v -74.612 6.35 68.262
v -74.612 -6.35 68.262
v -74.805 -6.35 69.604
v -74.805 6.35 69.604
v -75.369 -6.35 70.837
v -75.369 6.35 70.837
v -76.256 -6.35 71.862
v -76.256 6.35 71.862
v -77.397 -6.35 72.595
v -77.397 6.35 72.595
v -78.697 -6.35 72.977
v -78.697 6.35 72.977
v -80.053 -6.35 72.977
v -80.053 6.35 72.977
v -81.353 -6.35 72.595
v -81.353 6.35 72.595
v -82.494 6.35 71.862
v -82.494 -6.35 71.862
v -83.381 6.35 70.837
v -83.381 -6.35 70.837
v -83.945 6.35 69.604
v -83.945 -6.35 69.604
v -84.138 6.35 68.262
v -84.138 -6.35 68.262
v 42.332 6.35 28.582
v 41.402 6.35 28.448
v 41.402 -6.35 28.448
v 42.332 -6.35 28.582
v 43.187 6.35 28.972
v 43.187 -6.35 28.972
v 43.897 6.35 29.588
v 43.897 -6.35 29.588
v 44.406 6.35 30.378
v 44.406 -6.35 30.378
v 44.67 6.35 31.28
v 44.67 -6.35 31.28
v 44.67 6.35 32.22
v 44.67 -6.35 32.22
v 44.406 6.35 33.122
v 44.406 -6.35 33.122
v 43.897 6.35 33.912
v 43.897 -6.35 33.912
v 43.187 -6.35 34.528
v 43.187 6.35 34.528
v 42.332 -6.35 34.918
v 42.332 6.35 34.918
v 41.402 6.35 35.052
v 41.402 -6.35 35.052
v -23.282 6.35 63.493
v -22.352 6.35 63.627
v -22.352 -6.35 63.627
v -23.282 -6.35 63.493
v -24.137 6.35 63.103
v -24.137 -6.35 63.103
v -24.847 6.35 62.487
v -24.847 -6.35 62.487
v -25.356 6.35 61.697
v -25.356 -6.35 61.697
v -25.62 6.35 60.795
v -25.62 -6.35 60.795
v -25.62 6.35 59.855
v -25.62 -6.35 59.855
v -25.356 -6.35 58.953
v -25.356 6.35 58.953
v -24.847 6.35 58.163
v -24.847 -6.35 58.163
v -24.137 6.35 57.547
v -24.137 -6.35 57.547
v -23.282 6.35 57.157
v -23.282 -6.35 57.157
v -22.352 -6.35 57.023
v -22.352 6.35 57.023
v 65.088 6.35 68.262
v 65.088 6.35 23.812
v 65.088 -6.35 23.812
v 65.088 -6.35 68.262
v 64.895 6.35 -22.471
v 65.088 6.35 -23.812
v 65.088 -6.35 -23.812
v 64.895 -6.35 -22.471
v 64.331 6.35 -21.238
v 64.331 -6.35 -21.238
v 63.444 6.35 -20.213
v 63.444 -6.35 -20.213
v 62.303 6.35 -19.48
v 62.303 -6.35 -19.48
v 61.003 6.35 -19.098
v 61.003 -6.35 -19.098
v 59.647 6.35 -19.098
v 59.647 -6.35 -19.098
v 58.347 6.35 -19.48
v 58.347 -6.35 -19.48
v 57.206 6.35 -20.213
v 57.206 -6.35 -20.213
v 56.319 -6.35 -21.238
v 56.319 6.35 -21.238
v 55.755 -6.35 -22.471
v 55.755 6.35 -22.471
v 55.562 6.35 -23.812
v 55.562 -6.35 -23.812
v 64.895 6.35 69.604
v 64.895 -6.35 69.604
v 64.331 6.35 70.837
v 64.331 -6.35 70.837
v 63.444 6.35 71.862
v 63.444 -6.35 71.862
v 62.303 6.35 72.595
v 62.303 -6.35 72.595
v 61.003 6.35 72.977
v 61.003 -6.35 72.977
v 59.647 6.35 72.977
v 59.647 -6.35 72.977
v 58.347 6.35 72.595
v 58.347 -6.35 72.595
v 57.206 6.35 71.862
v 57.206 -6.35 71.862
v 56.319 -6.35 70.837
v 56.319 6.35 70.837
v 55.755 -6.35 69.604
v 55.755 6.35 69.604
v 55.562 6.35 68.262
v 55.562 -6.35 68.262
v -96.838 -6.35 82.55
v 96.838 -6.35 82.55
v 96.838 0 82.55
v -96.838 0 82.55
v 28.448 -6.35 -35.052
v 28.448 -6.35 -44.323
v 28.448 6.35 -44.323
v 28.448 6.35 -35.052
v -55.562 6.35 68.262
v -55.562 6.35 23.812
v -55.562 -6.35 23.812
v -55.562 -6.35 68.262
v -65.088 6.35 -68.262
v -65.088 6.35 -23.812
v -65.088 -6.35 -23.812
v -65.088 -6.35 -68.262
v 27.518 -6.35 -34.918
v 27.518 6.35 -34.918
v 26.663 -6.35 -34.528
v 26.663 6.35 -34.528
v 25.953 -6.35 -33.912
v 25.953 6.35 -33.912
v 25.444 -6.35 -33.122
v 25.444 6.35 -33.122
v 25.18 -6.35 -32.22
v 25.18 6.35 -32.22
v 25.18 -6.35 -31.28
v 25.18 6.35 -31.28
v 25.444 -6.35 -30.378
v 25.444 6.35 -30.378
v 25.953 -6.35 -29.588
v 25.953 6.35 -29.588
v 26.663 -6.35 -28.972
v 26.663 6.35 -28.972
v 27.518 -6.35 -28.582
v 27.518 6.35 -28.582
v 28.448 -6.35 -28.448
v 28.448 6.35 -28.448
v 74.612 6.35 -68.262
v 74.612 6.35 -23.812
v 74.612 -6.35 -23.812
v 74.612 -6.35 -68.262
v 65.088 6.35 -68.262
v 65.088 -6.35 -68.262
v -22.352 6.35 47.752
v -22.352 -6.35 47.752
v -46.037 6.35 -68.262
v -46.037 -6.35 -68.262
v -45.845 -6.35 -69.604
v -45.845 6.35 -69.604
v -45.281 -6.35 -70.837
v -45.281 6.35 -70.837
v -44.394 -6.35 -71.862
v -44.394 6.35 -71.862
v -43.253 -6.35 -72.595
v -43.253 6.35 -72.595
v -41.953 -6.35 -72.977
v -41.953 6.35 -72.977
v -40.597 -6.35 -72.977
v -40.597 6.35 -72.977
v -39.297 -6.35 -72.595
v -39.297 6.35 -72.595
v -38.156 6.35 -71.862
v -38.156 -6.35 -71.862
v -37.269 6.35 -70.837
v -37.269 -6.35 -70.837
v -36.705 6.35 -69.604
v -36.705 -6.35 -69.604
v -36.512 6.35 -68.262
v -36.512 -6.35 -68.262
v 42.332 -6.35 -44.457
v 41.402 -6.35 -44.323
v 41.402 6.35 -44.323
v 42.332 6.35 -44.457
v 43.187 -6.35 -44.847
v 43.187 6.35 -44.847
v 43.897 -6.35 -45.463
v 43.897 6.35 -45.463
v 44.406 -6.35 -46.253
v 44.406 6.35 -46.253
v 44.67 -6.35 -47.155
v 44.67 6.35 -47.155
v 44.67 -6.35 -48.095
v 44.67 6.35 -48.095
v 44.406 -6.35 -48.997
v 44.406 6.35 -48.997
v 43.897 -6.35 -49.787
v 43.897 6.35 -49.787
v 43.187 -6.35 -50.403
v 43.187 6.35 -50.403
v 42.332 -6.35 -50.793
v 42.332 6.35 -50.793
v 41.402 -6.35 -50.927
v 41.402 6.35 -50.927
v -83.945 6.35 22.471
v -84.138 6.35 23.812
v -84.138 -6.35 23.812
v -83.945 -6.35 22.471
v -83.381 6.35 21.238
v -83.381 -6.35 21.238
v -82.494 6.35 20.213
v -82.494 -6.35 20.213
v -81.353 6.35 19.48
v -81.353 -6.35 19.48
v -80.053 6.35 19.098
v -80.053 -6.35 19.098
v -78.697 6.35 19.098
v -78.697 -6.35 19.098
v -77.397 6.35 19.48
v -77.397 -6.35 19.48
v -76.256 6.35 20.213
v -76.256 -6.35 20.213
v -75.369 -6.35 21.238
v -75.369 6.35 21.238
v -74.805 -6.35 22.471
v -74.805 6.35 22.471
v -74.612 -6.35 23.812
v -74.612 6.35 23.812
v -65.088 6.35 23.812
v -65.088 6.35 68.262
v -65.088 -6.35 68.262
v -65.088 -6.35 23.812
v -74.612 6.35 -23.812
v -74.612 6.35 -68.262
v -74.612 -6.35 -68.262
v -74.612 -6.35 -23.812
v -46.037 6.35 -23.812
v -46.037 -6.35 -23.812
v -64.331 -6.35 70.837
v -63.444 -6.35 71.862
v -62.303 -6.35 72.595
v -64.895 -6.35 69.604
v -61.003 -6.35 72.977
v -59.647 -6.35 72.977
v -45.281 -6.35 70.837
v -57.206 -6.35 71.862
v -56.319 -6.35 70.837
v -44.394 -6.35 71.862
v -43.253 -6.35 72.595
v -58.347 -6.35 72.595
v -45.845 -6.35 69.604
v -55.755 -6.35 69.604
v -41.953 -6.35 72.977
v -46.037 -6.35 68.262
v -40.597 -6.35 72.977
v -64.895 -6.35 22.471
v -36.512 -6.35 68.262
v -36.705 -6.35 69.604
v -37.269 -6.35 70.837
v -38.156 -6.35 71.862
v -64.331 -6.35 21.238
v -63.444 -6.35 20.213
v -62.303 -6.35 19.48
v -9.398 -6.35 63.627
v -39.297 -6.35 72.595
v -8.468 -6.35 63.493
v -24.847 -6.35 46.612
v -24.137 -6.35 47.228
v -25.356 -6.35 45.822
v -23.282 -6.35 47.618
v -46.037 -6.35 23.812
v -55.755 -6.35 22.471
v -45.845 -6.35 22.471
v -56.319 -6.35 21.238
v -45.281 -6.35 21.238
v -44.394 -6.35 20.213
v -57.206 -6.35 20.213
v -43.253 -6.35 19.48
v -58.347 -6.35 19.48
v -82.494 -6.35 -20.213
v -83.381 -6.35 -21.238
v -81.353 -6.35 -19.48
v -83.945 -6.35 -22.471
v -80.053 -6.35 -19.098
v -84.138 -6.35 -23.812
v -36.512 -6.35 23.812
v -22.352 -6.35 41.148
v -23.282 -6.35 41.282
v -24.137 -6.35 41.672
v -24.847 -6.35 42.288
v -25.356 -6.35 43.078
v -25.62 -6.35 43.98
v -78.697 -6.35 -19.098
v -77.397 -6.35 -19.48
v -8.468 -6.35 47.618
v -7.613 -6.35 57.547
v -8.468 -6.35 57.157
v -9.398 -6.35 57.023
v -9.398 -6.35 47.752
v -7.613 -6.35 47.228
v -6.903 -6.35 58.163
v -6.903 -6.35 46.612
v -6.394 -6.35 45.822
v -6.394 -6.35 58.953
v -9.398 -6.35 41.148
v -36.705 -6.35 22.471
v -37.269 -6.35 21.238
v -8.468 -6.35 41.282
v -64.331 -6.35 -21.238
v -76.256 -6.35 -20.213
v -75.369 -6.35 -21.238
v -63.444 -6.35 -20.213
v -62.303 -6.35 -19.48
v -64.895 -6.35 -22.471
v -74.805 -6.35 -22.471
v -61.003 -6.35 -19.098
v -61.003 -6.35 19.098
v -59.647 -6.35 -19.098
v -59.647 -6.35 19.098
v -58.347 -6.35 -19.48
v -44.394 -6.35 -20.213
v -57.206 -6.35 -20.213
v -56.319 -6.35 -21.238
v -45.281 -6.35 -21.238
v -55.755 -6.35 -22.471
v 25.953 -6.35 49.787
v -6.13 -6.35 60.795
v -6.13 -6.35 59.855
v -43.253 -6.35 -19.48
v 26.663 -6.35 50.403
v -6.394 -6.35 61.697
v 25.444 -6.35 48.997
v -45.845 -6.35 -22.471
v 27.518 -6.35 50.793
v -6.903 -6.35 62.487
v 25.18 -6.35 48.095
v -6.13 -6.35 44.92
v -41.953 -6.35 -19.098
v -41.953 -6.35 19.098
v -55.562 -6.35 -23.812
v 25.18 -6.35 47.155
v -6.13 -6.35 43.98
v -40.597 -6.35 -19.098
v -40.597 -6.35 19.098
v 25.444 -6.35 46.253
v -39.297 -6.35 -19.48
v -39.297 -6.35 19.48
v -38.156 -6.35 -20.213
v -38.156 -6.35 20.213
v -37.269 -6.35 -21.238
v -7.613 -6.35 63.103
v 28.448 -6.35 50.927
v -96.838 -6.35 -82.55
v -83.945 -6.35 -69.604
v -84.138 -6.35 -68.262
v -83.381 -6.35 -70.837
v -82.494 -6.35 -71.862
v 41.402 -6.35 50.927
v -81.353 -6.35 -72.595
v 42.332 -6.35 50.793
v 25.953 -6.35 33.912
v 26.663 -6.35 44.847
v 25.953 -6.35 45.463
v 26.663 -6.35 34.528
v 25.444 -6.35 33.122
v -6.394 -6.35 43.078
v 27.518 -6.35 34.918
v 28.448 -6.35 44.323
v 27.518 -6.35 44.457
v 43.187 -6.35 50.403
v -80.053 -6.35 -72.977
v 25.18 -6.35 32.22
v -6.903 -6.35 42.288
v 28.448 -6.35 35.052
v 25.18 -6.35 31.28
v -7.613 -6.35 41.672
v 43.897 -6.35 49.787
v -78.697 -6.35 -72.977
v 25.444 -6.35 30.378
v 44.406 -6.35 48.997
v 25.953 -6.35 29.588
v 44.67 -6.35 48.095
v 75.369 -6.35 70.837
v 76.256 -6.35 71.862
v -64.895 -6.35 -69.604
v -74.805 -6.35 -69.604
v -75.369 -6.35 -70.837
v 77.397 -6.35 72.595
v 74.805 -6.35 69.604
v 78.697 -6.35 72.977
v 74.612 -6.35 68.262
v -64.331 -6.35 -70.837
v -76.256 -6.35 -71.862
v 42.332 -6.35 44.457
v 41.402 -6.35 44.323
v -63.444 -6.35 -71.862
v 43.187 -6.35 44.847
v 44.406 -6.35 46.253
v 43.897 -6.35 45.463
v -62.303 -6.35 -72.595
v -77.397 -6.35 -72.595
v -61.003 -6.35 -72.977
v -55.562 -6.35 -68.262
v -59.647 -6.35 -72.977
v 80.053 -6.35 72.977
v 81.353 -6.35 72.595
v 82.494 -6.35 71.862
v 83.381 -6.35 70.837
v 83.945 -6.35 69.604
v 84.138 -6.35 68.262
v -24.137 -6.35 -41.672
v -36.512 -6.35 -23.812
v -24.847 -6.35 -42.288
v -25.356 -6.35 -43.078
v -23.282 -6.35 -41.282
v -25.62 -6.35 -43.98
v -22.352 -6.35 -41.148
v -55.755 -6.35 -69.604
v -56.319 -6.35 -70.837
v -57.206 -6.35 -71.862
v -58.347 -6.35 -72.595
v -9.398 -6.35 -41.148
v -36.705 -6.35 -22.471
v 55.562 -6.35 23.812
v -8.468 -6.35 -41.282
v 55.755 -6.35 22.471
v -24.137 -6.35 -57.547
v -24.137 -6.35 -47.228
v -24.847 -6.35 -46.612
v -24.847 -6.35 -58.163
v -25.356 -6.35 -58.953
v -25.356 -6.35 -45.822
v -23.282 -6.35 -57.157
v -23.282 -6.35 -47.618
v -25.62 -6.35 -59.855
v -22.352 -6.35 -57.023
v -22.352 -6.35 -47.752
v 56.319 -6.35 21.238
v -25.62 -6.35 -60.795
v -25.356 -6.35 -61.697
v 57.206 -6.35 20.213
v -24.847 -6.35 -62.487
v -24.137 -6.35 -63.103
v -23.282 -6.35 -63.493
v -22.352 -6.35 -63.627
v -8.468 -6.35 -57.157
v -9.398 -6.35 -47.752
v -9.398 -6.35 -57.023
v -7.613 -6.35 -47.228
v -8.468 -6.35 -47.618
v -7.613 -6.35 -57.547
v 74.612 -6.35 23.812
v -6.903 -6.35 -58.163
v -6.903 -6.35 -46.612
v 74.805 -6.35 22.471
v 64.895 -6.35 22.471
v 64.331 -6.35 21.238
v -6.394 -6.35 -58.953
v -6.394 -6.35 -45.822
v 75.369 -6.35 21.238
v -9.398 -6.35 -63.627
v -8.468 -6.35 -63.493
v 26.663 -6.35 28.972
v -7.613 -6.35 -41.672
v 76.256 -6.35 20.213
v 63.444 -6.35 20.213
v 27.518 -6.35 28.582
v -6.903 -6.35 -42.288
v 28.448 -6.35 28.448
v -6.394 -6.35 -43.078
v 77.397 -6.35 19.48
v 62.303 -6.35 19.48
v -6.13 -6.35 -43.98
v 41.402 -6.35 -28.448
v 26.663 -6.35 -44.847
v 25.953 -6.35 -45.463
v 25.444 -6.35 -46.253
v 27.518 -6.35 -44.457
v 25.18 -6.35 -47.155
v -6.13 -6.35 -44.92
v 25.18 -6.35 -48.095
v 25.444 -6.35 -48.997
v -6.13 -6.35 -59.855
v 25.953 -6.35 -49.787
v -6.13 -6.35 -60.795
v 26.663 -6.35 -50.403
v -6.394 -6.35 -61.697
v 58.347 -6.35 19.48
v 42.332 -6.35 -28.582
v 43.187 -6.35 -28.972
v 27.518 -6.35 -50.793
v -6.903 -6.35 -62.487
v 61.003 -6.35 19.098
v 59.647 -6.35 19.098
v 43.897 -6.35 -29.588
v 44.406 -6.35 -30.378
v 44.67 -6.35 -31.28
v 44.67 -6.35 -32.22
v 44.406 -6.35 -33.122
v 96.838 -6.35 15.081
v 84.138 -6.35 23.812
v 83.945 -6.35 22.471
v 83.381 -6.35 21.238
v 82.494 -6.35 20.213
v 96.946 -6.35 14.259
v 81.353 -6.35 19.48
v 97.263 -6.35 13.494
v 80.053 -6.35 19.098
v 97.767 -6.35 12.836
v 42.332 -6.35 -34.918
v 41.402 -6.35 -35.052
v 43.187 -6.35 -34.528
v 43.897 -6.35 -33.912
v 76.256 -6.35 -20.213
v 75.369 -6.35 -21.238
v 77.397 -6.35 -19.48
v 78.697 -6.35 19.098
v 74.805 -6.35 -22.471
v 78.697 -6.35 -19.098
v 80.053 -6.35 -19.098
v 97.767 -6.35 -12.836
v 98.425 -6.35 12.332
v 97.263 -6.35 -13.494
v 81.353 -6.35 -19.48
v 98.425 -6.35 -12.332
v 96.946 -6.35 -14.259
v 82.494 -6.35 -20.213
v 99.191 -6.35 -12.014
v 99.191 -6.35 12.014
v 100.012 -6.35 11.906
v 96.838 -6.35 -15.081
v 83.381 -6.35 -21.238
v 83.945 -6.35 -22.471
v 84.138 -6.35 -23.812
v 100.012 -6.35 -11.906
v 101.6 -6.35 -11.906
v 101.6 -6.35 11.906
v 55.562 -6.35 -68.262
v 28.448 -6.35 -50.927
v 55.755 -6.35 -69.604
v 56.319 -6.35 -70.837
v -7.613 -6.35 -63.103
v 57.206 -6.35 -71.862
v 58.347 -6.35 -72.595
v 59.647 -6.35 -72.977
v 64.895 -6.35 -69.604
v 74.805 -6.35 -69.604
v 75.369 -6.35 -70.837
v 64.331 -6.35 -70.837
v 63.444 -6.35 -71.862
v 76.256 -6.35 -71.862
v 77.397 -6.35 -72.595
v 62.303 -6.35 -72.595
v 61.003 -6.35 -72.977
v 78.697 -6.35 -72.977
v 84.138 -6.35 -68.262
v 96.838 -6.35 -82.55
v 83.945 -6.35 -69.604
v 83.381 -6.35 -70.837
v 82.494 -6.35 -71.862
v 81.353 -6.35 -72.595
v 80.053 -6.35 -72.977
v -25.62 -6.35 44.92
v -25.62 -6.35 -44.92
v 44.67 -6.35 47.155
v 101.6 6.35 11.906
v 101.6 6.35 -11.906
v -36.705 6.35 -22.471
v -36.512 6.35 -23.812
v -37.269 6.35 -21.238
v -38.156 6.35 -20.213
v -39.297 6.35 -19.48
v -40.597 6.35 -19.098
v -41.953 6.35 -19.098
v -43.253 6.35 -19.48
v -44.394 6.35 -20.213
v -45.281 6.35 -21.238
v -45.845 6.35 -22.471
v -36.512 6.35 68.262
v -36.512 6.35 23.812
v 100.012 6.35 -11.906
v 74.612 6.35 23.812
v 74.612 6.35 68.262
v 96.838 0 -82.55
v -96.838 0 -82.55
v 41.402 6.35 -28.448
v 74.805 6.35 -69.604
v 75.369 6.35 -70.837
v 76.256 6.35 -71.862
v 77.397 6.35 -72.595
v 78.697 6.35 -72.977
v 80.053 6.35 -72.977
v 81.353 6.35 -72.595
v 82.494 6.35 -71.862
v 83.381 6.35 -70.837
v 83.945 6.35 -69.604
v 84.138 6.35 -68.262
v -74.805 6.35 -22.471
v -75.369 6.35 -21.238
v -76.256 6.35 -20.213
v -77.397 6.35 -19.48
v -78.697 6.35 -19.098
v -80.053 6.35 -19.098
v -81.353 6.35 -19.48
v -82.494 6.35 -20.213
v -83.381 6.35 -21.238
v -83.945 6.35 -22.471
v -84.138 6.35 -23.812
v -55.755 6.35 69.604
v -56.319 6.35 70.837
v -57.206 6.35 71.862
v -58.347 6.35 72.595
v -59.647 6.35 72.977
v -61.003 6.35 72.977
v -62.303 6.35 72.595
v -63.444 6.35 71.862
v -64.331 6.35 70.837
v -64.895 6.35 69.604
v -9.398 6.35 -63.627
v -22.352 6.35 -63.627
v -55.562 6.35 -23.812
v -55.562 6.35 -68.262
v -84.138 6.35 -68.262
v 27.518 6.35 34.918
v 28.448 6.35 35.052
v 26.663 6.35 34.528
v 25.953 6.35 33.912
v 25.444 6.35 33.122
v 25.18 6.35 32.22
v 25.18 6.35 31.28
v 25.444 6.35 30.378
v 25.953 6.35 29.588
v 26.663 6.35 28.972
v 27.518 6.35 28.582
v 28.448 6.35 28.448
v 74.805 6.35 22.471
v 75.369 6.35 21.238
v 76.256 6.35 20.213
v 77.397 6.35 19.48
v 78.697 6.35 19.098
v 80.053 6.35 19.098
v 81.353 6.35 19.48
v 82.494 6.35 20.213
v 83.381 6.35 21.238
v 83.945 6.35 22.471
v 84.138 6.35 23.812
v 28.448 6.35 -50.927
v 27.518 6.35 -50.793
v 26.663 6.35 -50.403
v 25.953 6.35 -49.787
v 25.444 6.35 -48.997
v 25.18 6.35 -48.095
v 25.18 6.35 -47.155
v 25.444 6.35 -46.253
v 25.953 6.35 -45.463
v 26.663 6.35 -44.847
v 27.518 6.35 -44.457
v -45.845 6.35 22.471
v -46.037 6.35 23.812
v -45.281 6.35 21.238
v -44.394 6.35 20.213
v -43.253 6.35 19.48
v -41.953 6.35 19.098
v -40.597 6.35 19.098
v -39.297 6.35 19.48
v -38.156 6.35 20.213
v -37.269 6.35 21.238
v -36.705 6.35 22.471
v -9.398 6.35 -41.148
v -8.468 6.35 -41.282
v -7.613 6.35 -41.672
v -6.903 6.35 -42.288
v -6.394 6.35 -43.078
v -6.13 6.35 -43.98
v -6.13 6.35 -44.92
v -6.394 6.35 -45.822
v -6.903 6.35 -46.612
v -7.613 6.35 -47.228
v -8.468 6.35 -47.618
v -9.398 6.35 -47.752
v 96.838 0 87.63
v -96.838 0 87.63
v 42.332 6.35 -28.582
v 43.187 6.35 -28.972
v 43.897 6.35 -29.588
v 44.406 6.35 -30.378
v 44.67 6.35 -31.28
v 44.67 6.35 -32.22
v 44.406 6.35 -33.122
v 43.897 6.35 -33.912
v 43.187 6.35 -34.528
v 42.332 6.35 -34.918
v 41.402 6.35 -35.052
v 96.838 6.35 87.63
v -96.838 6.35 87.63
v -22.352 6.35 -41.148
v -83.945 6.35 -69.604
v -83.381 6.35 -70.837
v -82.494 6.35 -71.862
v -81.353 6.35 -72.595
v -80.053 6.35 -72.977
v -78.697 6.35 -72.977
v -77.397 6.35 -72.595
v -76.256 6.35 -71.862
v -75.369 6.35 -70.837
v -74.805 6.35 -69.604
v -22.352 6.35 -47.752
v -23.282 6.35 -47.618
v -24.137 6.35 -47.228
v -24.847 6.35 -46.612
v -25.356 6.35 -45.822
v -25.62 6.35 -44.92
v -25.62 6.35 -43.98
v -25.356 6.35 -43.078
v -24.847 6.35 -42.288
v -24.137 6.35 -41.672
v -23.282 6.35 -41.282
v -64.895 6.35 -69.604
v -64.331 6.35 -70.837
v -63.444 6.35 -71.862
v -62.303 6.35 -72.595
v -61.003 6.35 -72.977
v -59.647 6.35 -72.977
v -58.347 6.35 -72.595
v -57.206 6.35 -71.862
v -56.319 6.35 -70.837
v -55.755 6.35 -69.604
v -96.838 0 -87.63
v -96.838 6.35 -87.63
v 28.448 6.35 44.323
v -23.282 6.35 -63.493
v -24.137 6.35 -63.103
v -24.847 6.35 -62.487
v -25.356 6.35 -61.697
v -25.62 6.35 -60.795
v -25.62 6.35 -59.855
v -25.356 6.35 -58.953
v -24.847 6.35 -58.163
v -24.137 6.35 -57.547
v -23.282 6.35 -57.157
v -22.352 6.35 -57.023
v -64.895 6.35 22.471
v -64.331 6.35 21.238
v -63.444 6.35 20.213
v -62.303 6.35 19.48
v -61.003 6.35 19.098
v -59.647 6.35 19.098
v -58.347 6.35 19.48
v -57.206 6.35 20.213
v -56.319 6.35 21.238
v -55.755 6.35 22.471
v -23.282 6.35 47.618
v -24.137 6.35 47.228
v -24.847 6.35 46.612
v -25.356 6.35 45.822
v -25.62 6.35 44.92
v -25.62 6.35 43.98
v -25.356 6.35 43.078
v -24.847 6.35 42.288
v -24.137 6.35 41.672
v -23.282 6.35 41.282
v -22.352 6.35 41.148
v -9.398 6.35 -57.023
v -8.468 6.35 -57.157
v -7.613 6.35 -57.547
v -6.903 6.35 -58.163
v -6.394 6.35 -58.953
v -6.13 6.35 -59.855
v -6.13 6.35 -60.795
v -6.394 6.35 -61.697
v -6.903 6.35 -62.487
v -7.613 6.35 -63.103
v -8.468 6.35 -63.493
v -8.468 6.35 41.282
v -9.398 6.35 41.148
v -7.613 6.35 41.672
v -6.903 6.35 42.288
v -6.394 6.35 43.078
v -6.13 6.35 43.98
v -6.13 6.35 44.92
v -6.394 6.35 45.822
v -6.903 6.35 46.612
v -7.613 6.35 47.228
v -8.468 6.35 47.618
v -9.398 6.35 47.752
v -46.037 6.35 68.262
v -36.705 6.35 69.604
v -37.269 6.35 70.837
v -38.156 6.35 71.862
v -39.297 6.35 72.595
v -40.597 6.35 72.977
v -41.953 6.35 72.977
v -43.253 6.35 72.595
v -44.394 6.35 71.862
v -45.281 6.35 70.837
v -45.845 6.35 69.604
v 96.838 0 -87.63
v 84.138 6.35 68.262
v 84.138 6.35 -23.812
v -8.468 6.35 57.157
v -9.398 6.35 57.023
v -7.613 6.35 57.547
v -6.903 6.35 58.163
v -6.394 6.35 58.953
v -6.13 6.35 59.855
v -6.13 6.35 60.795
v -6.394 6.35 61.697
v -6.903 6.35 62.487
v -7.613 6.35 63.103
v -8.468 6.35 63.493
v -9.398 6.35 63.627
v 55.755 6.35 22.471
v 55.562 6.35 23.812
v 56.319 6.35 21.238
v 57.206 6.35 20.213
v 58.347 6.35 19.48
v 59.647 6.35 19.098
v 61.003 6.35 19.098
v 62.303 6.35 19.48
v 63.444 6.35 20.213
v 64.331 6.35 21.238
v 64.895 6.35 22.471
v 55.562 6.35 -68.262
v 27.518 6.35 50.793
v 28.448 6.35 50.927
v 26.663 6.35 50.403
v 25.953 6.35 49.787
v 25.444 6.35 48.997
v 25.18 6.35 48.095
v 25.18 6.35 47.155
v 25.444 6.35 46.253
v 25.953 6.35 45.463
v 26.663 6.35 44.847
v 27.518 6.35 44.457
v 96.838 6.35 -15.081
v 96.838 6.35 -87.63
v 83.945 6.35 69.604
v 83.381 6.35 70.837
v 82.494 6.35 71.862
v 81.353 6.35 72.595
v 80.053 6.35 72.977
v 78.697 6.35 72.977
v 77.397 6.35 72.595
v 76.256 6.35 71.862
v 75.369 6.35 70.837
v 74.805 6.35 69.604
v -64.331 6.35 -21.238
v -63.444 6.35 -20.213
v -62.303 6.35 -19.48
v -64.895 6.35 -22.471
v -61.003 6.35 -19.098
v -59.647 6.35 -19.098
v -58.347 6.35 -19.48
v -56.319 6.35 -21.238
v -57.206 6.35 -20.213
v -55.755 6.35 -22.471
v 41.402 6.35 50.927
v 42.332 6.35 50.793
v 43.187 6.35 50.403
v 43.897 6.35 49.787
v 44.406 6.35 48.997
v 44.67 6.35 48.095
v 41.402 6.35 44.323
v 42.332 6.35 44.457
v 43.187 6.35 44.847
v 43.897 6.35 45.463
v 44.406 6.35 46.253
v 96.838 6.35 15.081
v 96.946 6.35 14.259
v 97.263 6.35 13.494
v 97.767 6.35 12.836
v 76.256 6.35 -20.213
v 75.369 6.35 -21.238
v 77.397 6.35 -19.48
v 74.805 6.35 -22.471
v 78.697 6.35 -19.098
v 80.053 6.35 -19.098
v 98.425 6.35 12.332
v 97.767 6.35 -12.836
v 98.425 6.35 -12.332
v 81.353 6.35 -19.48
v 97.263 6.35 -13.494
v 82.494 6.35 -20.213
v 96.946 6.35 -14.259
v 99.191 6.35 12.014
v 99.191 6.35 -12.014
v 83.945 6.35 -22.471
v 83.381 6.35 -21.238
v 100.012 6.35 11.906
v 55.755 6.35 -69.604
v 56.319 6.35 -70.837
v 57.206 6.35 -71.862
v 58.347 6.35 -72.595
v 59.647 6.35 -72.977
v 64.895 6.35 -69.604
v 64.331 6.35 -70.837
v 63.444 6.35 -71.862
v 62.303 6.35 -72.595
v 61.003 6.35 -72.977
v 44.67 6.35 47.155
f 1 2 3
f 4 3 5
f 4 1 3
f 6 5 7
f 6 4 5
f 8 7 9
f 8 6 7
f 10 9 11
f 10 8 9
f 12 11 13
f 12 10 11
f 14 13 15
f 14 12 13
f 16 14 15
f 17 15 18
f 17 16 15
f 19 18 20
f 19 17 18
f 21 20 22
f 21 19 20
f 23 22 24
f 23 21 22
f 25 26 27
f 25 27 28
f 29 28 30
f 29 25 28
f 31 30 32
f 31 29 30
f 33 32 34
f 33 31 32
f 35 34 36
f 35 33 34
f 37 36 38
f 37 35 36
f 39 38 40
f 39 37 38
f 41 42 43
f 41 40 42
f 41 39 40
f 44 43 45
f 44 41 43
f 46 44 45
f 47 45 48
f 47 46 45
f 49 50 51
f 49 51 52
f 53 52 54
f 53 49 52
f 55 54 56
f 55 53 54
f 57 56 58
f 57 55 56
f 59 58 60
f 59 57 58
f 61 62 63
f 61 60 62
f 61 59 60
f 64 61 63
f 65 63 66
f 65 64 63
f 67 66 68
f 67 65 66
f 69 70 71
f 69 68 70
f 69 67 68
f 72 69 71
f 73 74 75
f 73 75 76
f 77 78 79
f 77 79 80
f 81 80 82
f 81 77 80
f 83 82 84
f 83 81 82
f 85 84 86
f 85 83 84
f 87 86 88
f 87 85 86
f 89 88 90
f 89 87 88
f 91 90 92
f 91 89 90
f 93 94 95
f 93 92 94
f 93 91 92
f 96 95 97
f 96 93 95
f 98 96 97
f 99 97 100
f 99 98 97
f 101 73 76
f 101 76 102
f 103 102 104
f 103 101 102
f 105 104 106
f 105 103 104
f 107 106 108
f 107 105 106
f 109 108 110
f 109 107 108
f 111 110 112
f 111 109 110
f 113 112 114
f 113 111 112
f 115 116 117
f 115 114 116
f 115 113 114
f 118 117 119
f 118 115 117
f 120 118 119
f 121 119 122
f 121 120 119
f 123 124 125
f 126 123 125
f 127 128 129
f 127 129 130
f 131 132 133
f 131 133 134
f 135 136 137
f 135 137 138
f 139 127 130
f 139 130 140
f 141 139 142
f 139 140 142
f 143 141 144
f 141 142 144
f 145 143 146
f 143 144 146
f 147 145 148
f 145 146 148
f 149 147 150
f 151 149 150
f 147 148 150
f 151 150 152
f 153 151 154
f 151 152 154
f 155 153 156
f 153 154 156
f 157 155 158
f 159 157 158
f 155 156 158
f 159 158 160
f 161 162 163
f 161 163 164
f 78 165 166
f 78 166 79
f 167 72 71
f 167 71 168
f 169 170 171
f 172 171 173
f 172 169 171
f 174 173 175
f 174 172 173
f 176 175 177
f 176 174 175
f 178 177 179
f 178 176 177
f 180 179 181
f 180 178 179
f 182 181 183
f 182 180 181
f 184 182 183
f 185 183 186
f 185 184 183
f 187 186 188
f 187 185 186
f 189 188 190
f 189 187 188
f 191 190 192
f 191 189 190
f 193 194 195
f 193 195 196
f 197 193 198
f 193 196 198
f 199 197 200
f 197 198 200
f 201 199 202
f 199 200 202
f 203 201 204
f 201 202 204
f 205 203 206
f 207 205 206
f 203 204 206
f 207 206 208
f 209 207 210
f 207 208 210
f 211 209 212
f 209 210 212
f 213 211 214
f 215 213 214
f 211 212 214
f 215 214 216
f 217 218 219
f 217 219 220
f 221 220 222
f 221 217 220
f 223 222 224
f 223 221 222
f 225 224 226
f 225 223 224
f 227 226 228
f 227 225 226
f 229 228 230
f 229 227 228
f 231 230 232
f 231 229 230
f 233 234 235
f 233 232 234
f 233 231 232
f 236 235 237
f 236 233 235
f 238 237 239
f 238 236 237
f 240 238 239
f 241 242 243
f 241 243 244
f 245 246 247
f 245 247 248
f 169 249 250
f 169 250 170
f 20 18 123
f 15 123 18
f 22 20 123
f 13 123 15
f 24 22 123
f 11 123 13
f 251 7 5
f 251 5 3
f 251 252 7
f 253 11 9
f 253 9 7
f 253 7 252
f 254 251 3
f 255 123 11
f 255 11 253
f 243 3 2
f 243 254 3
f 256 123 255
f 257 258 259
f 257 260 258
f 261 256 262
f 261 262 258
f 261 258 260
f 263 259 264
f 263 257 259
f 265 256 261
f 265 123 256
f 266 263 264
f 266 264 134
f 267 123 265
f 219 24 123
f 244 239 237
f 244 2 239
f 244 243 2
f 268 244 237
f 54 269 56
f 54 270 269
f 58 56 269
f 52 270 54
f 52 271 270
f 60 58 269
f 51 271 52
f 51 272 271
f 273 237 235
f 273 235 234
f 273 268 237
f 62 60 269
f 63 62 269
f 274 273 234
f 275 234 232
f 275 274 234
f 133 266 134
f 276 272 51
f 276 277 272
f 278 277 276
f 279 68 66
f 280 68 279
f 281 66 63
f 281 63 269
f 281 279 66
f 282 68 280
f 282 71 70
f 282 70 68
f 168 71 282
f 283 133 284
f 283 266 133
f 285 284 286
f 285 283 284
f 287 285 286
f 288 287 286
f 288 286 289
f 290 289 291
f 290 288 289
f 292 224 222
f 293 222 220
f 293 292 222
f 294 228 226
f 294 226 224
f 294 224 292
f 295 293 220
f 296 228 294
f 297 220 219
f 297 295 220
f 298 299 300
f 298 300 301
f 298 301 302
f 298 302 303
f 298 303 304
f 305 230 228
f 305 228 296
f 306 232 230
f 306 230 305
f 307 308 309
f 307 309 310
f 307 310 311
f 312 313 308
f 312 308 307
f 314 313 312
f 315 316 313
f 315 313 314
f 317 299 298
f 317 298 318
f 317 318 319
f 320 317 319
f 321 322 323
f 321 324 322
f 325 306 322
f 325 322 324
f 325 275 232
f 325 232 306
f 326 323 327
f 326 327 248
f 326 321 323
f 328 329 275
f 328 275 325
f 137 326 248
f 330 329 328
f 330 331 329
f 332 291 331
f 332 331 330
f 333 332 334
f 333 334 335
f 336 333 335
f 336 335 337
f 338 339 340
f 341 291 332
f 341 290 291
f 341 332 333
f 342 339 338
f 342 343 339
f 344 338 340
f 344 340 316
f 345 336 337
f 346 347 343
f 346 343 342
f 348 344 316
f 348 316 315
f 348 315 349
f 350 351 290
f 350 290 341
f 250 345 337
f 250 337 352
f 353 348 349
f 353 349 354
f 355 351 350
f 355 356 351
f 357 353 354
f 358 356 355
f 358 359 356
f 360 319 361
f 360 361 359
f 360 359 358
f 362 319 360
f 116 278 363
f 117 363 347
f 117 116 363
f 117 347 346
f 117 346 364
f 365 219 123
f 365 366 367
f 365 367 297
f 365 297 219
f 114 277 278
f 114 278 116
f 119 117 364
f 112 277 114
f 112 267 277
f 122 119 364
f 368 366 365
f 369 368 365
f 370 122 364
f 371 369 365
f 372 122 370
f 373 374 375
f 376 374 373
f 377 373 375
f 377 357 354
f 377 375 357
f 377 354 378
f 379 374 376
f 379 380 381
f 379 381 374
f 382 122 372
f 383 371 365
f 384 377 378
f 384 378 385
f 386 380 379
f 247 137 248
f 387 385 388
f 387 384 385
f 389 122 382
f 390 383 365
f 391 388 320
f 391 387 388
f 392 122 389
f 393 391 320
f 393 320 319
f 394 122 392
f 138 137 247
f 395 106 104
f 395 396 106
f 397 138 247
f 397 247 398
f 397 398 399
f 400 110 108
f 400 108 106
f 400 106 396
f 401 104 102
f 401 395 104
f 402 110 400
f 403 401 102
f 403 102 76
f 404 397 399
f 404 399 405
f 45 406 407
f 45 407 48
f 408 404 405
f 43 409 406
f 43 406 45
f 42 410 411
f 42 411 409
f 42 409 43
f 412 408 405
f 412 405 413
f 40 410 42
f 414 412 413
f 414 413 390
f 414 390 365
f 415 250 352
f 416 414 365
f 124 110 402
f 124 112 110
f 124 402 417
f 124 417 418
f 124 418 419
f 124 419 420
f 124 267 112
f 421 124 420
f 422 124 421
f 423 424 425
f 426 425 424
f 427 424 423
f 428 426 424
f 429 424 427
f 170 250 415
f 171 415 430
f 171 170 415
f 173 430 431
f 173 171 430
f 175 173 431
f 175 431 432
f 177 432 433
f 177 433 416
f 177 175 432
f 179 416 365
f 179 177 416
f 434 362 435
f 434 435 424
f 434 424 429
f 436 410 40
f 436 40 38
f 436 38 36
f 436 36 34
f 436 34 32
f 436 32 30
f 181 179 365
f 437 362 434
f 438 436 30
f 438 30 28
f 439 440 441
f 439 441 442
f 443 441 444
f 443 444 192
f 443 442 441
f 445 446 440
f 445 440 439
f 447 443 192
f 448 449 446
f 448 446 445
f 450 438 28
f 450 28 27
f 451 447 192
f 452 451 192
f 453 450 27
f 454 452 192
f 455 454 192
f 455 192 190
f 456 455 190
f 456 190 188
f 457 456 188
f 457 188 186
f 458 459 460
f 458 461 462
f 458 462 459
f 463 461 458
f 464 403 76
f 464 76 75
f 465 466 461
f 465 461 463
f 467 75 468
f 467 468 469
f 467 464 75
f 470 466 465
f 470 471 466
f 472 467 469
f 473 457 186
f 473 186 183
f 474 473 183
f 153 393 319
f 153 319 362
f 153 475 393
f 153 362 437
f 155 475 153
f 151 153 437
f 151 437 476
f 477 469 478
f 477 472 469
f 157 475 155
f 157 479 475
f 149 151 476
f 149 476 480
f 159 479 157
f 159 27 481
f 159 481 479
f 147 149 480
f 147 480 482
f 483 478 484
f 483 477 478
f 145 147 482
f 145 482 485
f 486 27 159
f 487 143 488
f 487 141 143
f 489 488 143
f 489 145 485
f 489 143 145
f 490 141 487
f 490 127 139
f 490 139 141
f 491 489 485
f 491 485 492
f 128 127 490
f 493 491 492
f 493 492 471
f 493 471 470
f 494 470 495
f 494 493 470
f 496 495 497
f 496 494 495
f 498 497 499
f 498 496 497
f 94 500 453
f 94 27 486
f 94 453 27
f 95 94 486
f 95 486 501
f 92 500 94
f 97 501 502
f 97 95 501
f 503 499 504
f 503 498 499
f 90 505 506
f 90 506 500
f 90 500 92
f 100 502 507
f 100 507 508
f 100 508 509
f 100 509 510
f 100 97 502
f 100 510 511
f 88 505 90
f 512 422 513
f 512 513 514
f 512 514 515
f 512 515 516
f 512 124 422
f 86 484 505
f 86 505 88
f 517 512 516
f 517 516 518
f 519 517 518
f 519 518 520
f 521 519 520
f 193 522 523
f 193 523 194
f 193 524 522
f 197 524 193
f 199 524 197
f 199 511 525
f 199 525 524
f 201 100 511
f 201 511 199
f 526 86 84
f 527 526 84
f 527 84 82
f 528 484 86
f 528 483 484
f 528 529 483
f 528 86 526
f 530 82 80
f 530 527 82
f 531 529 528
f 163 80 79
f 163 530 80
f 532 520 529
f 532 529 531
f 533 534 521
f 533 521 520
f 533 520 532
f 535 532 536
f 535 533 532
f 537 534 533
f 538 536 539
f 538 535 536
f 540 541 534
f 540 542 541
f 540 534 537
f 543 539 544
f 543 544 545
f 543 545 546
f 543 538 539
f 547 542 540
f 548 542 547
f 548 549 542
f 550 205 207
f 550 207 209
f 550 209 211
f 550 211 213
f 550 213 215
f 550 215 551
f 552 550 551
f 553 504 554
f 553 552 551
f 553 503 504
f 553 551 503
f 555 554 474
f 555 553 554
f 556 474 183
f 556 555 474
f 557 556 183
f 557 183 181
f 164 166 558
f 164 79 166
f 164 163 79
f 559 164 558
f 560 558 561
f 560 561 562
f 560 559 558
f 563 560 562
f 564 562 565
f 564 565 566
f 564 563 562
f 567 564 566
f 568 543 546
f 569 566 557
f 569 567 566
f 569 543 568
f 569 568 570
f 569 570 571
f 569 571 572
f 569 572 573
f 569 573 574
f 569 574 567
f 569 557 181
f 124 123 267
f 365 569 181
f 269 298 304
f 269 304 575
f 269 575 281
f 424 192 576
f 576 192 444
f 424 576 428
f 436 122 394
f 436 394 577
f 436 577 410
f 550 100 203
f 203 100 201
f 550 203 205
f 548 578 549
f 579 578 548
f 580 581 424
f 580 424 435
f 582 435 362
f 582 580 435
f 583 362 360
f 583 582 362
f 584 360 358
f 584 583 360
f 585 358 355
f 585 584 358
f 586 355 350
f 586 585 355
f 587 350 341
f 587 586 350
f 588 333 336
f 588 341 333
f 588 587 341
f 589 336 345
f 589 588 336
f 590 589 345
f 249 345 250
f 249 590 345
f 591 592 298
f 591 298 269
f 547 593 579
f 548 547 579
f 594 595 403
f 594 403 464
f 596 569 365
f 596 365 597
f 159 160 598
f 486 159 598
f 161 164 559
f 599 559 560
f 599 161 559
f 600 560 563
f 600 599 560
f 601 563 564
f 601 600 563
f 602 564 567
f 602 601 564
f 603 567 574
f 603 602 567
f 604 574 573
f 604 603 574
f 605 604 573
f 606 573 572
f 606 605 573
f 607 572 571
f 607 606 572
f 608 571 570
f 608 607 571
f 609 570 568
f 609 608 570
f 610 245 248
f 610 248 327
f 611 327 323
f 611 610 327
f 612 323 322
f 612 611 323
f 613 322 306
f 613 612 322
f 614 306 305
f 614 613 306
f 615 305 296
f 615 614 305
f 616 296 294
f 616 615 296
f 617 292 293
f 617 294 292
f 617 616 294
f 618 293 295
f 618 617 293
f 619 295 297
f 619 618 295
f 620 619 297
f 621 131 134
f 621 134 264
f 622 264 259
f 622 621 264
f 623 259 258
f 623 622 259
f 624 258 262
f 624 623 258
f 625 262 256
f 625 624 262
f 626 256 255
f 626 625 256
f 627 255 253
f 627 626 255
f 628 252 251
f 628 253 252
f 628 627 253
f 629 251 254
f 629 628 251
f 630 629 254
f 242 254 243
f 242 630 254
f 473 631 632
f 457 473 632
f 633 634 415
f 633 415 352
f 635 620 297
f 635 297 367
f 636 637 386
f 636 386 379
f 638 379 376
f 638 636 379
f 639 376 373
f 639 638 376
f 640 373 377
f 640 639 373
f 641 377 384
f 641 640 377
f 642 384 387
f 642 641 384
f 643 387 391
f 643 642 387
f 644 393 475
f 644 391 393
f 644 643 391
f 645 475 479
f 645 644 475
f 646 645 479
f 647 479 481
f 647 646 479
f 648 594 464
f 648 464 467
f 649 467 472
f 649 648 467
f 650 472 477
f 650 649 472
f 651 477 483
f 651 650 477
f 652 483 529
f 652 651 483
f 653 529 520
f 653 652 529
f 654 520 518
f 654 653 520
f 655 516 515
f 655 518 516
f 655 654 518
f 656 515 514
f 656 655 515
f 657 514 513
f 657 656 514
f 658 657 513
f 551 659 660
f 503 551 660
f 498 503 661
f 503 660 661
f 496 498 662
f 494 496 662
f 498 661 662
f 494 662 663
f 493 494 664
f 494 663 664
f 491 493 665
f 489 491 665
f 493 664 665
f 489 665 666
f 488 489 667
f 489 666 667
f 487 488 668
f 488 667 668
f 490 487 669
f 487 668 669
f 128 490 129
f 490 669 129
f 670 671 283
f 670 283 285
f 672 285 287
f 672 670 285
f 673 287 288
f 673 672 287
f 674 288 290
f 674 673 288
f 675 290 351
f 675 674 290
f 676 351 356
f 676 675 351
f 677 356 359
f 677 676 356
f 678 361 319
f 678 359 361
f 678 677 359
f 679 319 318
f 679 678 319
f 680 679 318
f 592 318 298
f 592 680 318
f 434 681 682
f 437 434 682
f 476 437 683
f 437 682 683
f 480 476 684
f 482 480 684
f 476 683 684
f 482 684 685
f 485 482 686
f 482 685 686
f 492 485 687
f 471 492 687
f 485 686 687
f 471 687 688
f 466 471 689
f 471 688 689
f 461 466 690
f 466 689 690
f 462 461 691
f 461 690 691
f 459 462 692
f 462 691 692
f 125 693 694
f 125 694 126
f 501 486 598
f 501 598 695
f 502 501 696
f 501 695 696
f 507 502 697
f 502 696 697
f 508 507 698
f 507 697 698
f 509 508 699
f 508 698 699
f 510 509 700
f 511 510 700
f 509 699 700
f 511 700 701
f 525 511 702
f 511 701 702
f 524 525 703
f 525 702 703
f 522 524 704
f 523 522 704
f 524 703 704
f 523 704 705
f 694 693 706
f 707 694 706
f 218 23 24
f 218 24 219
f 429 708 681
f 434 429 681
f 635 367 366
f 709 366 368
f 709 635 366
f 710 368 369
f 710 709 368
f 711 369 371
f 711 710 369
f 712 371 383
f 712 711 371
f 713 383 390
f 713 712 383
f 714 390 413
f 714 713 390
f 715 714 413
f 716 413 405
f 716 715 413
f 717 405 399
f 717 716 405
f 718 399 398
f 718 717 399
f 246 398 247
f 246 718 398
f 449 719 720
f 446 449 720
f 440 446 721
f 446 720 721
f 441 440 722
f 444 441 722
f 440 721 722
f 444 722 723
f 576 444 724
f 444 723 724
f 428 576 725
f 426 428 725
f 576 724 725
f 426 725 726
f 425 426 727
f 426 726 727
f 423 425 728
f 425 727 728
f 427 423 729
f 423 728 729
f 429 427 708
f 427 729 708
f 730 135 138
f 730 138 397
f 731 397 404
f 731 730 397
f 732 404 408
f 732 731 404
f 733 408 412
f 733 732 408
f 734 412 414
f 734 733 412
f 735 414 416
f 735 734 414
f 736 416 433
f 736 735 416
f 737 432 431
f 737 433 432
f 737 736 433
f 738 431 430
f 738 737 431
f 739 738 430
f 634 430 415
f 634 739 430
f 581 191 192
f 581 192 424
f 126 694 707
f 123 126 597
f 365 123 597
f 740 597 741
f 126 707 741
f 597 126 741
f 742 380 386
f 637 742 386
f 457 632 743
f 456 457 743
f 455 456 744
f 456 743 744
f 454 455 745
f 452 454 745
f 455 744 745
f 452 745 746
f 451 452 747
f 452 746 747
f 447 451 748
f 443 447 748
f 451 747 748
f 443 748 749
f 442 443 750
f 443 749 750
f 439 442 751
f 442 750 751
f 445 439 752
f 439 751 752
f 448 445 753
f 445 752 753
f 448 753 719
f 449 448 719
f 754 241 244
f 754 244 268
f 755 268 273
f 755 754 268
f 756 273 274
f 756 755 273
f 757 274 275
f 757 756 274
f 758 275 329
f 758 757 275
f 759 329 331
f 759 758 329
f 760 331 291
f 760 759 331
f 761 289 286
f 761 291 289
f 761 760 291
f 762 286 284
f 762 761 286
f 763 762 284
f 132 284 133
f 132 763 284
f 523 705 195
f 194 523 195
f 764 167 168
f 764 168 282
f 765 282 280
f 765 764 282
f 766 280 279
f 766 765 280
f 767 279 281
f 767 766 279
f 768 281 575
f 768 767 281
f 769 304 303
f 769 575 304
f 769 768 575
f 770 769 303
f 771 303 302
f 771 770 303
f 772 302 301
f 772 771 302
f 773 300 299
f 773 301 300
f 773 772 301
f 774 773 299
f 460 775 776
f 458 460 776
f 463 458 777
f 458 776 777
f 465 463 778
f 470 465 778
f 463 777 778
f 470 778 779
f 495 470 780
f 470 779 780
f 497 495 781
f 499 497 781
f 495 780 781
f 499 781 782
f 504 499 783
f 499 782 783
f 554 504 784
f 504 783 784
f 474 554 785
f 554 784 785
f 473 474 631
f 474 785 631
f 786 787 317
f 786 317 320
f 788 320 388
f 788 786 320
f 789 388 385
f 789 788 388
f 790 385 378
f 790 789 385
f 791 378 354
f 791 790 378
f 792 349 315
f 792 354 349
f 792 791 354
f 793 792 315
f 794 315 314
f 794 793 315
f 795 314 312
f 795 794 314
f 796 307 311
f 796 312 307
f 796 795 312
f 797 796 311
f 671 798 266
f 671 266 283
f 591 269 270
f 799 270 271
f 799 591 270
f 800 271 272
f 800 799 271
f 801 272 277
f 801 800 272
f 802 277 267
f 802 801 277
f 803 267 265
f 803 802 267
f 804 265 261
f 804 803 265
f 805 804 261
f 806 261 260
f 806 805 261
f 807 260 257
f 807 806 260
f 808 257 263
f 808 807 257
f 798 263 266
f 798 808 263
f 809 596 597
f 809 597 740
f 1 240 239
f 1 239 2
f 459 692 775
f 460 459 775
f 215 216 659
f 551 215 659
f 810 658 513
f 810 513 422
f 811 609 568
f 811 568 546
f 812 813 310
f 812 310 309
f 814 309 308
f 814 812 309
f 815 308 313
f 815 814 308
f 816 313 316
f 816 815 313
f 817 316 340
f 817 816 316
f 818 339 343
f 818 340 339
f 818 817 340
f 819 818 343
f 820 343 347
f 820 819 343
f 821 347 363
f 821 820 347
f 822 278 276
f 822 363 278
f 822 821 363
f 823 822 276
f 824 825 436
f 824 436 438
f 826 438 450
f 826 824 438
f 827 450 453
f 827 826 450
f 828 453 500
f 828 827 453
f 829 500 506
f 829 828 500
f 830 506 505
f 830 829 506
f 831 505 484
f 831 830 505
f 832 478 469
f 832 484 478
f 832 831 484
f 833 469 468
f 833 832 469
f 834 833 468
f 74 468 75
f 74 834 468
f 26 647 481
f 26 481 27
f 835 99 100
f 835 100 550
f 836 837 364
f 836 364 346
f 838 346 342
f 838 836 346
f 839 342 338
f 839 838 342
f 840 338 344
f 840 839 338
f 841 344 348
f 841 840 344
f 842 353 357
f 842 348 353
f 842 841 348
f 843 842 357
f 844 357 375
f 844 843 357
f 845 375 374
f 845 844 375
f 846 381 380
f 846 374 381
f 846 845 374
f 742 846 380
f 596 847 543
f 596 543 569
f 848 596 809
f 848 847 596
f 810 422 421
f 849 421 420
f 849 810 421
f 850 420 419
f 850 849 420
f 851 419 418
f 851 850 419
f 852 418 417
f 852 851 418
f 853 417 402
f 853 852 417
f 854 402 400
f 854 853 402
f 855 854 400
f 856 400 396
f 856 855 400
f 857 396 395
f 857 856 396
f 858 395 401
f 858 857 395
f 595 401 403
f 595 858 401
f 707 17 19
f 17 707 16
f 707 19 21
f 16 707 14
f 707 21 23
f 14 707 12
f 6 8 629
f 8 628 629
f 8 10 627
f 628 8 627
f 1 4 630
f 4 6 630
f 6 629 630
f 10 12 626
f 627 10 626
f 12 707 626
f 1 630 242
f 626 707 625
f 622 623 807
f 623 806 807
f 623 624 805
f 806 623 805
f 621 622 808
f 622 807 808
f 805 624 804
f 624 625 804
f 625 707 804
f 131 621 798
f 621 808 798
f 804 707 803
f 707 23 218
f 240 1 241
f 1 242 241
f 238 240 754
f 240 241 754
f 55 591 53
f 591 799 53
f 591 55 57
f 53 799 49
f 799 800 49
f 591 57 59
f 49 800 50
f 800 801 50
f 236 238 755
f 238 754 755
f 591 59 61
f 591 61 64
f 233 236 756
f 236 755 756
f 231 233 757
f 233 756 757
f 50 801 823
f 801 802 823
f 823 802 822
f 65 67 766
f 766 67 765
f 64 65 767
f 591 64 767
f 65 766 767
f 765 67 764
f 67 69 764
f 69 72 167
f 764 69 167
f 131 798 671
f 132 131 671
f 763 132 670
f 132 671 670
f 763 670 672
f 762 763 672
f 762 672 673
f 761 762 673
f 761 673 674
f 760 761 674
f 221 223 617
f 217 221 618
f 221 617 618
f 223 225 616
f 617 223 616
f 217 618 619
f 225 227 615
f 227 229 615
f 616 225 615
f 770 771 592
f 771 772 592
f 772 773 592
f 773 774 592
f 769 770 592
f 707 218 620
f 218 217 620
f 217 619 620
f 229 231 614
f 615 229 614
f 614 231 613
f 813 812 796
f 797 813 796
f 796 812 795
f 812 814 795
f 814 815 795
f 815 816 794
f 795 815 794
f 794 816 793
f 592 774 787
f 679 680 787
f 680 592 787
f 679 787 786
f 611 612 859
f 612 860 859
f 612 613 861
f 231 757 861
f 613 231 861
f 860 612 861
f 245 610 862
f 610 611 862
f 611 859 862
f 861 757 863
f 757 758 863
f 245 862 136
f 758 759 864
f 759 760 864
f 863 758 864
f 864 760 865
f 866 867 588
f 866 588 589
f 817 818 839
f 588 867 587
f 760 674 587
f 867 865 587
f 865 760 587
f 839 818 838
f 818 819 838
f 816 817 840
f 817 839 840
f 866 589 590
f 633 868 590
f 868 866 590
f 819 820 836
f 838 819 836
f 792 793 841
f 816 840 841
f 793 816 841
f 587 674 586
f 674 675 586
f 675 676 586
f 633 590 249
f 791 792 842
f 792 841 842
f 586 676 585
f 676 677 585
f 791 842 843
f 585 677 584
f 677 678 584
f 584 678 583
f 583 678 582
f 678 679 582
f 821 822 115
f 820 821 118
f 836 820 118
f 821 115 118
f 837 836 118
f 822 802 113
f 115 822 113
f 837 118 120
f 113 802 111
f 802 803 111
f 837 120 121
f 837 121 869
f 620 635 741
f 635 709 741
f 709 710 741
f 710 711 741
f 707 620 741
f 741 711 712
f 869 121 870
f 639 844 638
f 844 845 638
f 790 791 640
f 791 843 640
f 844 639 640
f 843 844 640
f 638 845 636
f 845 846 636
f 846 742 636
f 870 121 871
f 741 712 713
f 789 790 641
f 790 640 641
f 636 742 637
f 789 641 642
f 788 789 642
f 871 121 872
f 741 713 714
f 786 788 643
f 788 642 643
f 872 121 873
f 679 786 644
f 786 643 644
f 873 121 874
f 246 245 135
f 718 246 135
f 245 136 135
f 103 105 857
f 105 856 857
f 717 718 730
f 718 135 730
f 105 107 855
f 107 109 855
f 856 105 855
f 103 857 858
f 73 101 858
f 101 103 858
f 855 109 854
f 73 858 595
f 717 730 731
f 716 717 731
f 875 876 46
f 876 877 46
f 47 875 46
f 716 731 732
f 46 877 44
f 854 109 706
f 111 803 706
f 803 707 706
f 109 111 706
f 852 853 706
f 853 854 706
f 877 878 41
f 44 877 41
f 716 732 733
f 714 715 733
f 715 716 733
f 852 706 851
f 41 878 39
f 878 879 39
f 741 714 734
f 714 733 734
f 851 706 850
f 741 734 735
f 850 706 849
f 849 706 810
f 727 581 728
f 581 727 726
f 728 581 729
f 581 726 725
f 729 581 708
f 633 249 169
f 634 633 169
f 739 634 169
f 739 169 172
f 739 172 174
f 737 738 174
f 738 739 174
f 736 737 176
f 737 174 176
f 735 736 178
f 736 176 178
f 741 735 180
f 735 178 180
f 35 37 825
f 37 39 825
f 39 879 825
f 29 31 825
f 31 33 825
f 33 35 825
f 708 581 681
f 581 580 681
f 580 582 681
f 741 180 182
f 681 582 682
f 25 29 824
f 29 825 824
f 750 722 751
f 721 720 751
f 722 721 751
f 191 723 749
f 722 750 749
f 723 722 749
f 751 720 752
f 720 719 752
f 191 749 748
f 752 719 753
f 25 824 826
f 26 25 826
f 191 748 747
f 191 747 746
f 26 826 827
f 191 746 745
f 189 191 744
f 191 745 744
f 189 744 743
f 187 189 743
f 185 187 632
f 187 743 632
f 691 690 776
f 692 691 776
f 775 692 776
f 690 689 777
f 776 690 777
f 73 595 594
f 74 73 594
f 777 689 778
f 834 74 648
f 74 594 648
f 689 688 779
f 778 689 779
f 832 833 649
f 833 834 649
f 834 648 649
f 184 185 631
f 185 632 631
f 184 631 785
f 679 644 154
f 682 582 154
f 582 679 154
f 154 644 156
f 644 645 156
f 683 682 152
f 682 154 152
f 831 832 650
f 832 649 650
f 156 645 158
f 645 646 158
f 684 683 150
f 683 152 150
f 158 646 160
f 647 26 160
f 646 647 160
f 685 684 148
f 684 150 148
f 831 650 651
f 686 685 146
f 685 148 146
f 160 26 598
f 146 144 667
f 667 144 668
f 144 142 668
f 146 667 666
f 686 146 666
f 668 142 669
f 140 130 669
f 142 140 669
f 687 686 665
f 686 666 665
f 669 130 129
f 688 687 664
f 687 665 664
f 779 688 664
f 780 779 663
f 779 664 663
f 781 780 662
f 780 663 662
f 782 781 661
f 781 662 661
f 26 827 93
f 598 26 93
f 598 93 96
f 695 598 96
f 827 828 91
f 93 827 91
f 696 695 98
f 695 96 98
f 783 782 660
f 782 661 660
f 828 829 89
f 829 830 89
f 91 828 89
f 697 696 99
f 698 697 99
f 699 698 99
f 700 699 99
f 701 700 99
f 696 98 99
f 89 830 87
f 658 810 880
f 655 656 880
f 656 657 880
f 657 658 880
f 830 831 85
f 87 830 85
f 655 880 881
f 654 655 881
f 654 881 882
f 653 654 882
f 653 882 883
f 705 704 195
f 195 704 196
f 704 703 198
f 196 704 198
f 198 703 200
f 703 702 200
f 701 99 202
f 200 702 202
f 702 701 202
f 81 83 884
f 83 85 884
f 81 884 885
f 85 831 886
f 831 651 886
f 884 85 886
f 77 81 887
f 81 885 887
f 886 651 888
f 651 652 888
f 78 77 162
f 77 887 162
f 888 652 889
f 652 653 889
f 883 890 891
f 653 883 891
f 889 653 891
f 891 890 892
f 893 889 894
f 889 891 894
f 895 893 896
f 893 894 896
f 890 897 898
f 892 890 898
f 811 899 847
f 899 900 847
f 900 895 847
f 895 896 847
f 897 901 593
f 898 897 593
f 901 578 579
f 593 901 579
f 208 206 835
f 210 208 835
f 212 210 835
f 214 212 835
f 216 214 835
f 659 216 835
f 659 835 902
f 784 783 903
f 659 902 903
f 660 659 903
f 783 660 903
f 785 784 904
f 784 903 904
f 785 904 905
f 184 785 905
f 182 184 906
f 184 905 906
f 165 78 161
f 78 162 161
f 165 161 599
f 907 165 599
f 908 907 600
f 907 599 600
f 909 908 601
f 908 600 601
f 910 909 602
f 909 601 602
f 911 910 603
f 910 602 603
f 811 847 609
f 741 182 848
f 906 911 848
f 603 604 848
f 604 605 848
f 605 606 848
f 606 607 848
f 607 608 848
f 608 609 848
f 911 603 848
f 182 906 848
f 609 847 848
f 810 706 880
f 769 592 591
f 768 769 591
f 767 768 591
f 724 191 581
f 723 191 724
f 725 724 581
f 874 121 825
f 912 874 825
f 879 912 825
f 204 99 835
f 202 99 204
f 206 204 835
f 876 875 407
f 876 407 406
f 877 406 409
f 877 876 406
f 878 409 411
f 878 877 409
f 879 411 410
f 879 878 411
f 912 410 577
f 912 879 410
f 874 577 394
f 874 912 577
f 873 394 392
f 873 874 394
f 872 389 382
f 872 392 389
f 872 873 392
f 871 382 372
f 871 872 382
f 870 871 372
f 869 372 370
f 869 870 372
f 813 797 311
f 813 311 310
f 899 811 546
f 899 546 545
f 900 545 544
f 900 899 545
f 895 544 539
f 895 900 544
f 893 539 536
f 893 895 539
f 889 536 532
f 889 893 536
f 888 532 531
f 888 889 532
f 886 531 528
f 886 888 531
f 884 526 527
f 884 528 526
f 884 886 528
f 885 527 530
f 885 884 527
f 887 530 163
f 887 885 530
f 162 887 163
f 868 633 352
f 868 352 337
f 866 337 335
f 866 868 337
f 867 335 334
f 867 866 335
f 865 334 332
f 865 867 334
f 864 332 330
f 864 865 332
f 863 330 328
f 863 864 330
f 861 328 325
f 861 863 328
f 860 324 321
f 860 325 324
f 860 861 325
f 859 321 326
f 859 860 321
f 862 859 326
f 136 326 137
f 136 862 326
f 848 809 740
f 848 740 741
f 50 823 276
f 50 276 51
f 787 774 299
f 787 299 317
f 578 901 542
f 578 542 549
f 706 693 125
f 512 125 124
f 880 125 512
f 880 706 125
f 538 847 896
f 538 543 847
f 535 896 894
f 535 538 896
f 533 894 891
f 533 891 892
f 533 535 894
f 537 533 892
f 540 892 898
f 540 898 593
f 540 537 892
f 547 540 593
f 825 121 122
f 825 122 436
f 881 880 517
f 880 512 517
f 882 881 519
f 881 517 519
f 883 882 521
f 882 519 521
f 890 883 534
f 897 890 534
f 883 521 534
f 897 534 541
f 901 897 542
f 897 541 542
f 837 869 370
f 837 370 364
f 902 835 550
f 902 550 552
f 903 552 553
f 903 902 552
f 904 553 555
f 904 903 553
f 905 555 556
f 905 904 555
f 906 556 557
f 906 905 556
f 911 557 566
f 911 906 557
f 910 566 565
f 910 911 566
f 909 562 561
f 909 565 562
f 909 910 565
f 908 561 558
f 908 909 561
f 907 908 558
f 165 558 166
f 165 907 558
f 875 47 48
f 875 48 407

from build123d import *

# Parameters (mm, degrees)
SKETCH1_W           = 175.26
SKETCH1_H           = 12.7
BOSS_EXTRUDE1_DEPTH = 96.8375
SKETCH2_W           = 5.08
SKETCH2_H           = 6.35
CUT_EXTRUDE1_DEPTH  = 213.67191875
CUT_EXTRUDE2_DEPTH  = 132.216646453
CUT_EXTRUDE3_DEPTH  = 132.216646453
SKETCH5_W           = 4.7625
SKETCH5_H           = 23.8125
BOSS_EXTRUDE2_DEPTH = 12.7
FILLET1_R           = 3.175


with BuildPart() as part:
    # Sketch1 → Boss-Extrude1 (new, symmetric)
    with BuildSketch(Plane(origin=(0, 0, 0), x_dir=(0, 0, -1), z_dir=(1, 0, 0))):
        Rectangle(SKETCH1_W, SKETCH1_H)
    extrude(amount=BOSS_EXTRUDE1_DEPTH, both=True)

    # Sketch2 → Cut-Extrude1 (cut, through all)
    with BuildSketch(Plane(origin=(96.8375, 0, 0), x_dir=(0, 0, -1), z_dir=(1, 0, 0))):
        with Locations((-85.09, -3.175)):
            Rectangle(SKETCH2_W, SKETCH2_H)
        with Locations((85.09, -3.175)):
            Rectangle(SKETCH2_W, SKETCH2_H)
    extrude(amount=-CUT_EXTRUDE1_DEPTH, mode=Mode.SUBTRACT)

    # Sketch3 → Cut-Extrude2 (cut, through all)
    with BuildSketch(Plane(origin=(0, 6.35, 0), x_dir=(1, 0, 0), z_dir=(0, 1, 0))):
        with BuildLine():
            Line((28.448, -28.448), (41.402, -28.448))
            ThreePointArc((41.402, -28.448), (44.704, -31.75), (41.402, -35.052))
            Line((41.402, -35.052), (41.402, -44.323))
            ThreePointArc((41.402, -44.323), (44.704, -47.625), (41.402, -50.927))
            Line((41.402, -50.927), (28.448, -50.927))
            ThreePointArc((28.448, -50.927), (25.146, -47.625), (28.448, -44.323))
            Line((28.448, -44.323), (28.448, -35.052))
            ThreePointArc((28.448, -35.052), (25.146, -31.75), (28.448, -28.448))
        make_face()
        with BuildLine():
            Line((-22.352, -41.148), (-9.398, -41.148))
            ThreePointArc((-9.398, -41.148), (-6.096, -44.45), (-9.398, -47.752))
            Line((-9.398, -47.752), (-9.398, -57.023))
            ThreePointArc((-9.398, -57.023), (-6.096, -60.325), (-9.398, -63.627))
            Line((-9.398, -63.627), (-22.352, -63.627))
            ThreePointArc((-22.352, -63.627), (-25.654, -60.325), (-22.352, -57.023))
            Line((-22.352, -57.023), (-22.352, -47.752))
            ThreePointArc((-22.352, -47.752), (-25.654, -44.45), (-22.352, -41.148))
        make_face()
        with BuildLine():
            Line((-9.398, 47.752), (-9.398, 57.023))
            ThreePointArc((-9.398, 57.023), (-6.096, 60.325), (-9.398, 63.627))
            Line((-9.398, 63.627), (-22.352, 63.627))
            ThreePointArc((-22.352, 63.627), (-25.654, 60.325), (-22.352, 57.023))
            Line((-22.352, 57.023), (-22.352, 47.752))
            ThreePointArc((-22.352, 47.752), (-25.654, 44.45), (-22.352, 41.148))
            Line((-22.352, 41.148), (-9.398, 41.148))
            ThreePointArc((-9.398, 41.148), (-6.096, 44.45), (-9.398, 47.752))
        make_face()
        with BuildLine():
            Line((41.402, 35.052), (41.402, 44.323))
            ThreePointArc((41.402, 44.323), (44.704, 47.625), (41.402, 50.927))
            Line((41.402, 50.927), (28.448, 50.927))
            ThreePointArc((28.448, 50.927), (25.146, 47.625), (28.448, 44.323))
            Line((28.448, 44.323), (28.448, 35.052))
            ThreePointArc((28.448, 35.052), (25.146, 31.75), (28.448, 28.448))
            Line((28.448, 28.448), (41.402, 28.448))
            ThreePointArc((41.402, 28.448), (44.704, 31.75), (41.402, 35.052))
        make_face()
    extrude(amount=-CUT_EXTRUDE2_DEPTH, mode=Mode.SUBTRACT)

    # Sketch4 → Cut-Extrude3 (cut, through all)
    with BuildSketch(Plane(origin=(0, 6.35, 0), x_dir=(1, 0, 0), z_dir=(0, 1, 0))):
        with BuildLine():
            Line((55.5625, -68.2625), (55.5625, -23.8125))
            ThreePointArc((55.5625, -23.8125), (60.325, -19.05), (65.0875, -23.8125))
            Line((65.0875, -23.8125), (65.0875, -68.2625))
            ThreePointArc((65.0875, -68.2625), (60.325, -73.025), (55.5625, -68.2625))
        make_face()
        with BuildLine():
            Line((55.5625, 23.8125), (55.5625, 68.2625))
            ThreePointArc((55.5625, 68.2625), (60.325, 73.025), (65.0875, 68.2625))
            Line((65.0875, 68.2625), (65.0875, 23.8125))
            ThreePointArc((65.0875, 23.8125), (60.325, 19.05), (55.5625, 23.8125))
        make_face()
        with BuildLine():
            Line((84.1375, 68.2625), (84.1375, 23.8125))
            ThreePointArc((84.1375, 23.8125), (79.375, 19.05), (74.6125, 23.8125))
            Line((74.6125, 23.8125), (74.6125, 68.2625))
            ThreePointArc((74.6125, 68.2625), (79.375, 73.025), (84.1375, 68.2625))
        make_face()
        with BuildLine():
            Line((84.1375, -23.8125), (84.1375, -68.2625))
            ThreePointArc((84.1375, -68.2625), (79.375, -73.025), (74.6125, -68.2625))
            Line((74.6125, -68.2625), (74.6125, -23.8125))
            ThreePointArc((74.6125, -23.8125), (79.375, -19.05), (84.1375, -23.8125))
        make_face()
        with BuildLine():
            Line((-84.1375, -68.2625), (-84.1375, -23.8125))
            ThreePointArc((-84.1375, -23.8125), (-79.375, -19.05), (-74.6125, -23.8125))
            Line((-74.6125, -23.8125), (-74.6125, -68.2625))
            ThreePointArc((-74.6125, -68.2625), (-79.375, -73.025), (-84.1375, -68.2625))
        make_face()
        with BuildLine():
            Line((-84.1375, 23.8125), (-84.1375, 68.2625))
            ThreePointArc((-84.1375, 68.2625), (-79.375, 73.025), (-74.6125, 68.2625))
            Line((-74.6125, 68.2625), (-74.6125, 23.8125))
            ThreePointArc((-74.6125, 23.8125), (-79.375, 19.05), (-84.1375, 23.8125))
        make_face()
        with BuildLine():
            Line((-65.0875, -68.2625), (-65.0875, -23.8125))
            ThreePointArc((-65.0875, -23.8125), (-60.325, -19.05), (-55.5625, -23.8125))
            Line((-55.5625, -23.8125), (-55.5625, -68.2625))
            ThreePointArc((-55.5625, -68.2625), (-60.325, -73.025), (-65.0875, -68.2625))
        make_face()
        with BuildLine():
            Line((-65.0875, 23.8125), (-65.0875, 68.2625))
            ThreePointArc((-65.0875, 68.2625), (-60.325, 73.025), (-55.5625, 68.2625))
            Line((-55.5625, 68.2625), (-55.5625, 23.8125))
            ThreePointArc((-55.5625, 23.8125), (-60.325, 19.05), (-65.0875, 23.8125))
        make_face()
        with BuildLine():
            Line((-46.0375, -68.2625), (-46.0375, -23.8125))
            ThreePointArc((-46.0375, -23.8125), (-41.275, -19.05), (-36.5125, -23.8125))
            Line((-36.5125, -23.8125), (-36.5125, -68.2625))
            ThreePointArc((-36.5125, -68.2625), (-41.275, -73.025), (-46.0375, -68.2625))
        make_face()
        with BuildLine():
            Line((-46.0375, 23.8125), (-46.0375, 68.2625))
            ThreePointArc((-46.0375, 68.2625), (-41.275, 73.025), (-36.5125, 68.2625))
            Line((-36.5125, 68.2625), (-36.5125, 23.8125))
            ThreePointArc((-36.5125, 23.8125), (-41.275, 19.05), (-46.0375, 23.8125))
        make_face()
    extrude(amount=-CUT_EXTRUDE3_DEPTH, mode=Mode.SUBTRACT)

    # Sketch5 → Boss-Extrude2 (add)
    with BuildSketch(Plane(origin=(0, 6.35, 0), x_dir=(1, 0, 0), z_dir=(0, 1, 0))):
        with Locations((99.21875, 0)):
            Rectangle(SKETCH5_W, SKETCH5_H)
    extrude(amount=-BOSS_EXTRUDE2_DEPTH)

    # Fillet1
    fillet1_edges = [part.edges().sort_by_distance(p)[0] for p in [
        (96.8375, 0, 11.90625),
        (96.8375, 0, -11.90625),
    ]]
    fillet(fillet1_edges, radius=FILLET1_R)


solid = part.part
